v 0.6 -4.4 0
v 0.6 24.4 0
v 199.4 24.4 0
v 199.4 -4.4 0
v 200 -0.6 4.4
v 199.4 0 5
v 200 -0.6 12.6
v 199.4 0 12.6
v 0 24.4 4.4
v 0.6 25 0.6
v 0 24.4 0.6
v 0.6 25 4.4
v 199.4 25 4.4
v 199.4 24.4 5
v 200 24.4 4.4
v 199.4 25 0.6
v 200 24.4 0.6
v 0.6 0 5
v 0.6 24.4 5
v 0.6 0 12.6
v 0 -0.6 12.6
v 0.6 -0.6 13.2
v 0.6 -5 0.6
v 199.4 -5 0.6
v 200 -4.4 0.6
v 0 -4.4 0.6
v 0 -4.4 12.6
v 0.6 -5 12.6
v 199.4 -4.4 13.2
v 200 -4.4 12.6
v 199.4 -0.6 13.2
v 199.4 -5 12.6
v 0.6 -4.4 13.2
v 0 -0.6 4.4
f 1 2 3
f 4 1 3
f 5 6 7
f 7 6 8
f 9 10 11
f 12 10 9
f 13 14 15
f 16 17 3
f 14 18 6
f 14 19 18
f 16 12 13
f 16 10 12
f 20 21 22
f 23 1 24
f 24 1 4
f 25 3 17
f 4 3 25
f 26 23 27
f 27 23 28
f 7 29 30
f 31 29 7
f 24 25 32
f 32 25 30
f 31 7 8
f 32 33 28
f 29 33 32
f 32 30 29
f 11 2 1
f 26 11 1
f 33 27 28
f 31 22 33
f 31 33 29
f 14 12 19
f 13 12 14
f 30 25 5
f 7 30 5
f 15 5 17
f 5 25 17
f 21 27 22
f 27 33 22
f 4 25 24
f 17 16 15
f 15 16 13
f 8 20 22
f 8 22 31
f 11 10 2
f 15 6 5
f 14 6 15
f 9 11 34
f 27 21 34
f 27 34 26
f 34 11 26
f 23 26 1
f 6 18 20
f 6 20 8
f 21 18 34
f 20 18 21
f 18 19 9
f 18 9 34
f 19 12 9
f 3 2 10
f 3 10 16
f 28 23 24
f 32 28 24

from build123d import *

# Parameters (mm, degrees)
F0_W     = 200
F0_H     = 25
F0_H_2   = 5
F1_DEPTH = 5
F2_DEPTH = 13.2
F3_SIZE  = 0.6


with BuildPart() as f1:
    # F0 (on Top) → F1 (new body)
    with BuildSketch(Plane.XY):
        with Locations((100, 12.5)):
            Rectangle(F0_W, F0_H)
        with Locations((100, -2.5)):
            Rectangle(F0_W, F0_H_2)
    extrude(amount=F1_DEPTH)

    # F0 (on Top) → F2 (join)
    with BuildSketch(Plane.XY):
        with Locations((100, -2.5)):
            Rectangle(F0_W, F0_H_2)
    extrude(amount=F2_DEPTH)

    # F3
    f3_edges = [f1.edges().sort_by_distance(p)[0] for p in [
        (100, 25, 5),
        (200, 12.5, 5),
        (200, 25, 2.5),
        (200, 10, 0),
        (200, -5, 6.6),
        (200, -2.5, 13.2),
        (200, 0, 9.1),
        (0, 25, 2.5),
        (100, 25, 0),
        (0, 10, 0),
        (0, 12.5, 5),
        (0, 0, 9.1),
        (0, -2.5, 13.2),
        (0, -5, 6.6),
        (100, 0, 13.2),
        (100, -5, 13.2),
        (100, -5, 0),
    ]]
    chamfer(f3_edges, length=F3_SIZE)


solid = f1.part
